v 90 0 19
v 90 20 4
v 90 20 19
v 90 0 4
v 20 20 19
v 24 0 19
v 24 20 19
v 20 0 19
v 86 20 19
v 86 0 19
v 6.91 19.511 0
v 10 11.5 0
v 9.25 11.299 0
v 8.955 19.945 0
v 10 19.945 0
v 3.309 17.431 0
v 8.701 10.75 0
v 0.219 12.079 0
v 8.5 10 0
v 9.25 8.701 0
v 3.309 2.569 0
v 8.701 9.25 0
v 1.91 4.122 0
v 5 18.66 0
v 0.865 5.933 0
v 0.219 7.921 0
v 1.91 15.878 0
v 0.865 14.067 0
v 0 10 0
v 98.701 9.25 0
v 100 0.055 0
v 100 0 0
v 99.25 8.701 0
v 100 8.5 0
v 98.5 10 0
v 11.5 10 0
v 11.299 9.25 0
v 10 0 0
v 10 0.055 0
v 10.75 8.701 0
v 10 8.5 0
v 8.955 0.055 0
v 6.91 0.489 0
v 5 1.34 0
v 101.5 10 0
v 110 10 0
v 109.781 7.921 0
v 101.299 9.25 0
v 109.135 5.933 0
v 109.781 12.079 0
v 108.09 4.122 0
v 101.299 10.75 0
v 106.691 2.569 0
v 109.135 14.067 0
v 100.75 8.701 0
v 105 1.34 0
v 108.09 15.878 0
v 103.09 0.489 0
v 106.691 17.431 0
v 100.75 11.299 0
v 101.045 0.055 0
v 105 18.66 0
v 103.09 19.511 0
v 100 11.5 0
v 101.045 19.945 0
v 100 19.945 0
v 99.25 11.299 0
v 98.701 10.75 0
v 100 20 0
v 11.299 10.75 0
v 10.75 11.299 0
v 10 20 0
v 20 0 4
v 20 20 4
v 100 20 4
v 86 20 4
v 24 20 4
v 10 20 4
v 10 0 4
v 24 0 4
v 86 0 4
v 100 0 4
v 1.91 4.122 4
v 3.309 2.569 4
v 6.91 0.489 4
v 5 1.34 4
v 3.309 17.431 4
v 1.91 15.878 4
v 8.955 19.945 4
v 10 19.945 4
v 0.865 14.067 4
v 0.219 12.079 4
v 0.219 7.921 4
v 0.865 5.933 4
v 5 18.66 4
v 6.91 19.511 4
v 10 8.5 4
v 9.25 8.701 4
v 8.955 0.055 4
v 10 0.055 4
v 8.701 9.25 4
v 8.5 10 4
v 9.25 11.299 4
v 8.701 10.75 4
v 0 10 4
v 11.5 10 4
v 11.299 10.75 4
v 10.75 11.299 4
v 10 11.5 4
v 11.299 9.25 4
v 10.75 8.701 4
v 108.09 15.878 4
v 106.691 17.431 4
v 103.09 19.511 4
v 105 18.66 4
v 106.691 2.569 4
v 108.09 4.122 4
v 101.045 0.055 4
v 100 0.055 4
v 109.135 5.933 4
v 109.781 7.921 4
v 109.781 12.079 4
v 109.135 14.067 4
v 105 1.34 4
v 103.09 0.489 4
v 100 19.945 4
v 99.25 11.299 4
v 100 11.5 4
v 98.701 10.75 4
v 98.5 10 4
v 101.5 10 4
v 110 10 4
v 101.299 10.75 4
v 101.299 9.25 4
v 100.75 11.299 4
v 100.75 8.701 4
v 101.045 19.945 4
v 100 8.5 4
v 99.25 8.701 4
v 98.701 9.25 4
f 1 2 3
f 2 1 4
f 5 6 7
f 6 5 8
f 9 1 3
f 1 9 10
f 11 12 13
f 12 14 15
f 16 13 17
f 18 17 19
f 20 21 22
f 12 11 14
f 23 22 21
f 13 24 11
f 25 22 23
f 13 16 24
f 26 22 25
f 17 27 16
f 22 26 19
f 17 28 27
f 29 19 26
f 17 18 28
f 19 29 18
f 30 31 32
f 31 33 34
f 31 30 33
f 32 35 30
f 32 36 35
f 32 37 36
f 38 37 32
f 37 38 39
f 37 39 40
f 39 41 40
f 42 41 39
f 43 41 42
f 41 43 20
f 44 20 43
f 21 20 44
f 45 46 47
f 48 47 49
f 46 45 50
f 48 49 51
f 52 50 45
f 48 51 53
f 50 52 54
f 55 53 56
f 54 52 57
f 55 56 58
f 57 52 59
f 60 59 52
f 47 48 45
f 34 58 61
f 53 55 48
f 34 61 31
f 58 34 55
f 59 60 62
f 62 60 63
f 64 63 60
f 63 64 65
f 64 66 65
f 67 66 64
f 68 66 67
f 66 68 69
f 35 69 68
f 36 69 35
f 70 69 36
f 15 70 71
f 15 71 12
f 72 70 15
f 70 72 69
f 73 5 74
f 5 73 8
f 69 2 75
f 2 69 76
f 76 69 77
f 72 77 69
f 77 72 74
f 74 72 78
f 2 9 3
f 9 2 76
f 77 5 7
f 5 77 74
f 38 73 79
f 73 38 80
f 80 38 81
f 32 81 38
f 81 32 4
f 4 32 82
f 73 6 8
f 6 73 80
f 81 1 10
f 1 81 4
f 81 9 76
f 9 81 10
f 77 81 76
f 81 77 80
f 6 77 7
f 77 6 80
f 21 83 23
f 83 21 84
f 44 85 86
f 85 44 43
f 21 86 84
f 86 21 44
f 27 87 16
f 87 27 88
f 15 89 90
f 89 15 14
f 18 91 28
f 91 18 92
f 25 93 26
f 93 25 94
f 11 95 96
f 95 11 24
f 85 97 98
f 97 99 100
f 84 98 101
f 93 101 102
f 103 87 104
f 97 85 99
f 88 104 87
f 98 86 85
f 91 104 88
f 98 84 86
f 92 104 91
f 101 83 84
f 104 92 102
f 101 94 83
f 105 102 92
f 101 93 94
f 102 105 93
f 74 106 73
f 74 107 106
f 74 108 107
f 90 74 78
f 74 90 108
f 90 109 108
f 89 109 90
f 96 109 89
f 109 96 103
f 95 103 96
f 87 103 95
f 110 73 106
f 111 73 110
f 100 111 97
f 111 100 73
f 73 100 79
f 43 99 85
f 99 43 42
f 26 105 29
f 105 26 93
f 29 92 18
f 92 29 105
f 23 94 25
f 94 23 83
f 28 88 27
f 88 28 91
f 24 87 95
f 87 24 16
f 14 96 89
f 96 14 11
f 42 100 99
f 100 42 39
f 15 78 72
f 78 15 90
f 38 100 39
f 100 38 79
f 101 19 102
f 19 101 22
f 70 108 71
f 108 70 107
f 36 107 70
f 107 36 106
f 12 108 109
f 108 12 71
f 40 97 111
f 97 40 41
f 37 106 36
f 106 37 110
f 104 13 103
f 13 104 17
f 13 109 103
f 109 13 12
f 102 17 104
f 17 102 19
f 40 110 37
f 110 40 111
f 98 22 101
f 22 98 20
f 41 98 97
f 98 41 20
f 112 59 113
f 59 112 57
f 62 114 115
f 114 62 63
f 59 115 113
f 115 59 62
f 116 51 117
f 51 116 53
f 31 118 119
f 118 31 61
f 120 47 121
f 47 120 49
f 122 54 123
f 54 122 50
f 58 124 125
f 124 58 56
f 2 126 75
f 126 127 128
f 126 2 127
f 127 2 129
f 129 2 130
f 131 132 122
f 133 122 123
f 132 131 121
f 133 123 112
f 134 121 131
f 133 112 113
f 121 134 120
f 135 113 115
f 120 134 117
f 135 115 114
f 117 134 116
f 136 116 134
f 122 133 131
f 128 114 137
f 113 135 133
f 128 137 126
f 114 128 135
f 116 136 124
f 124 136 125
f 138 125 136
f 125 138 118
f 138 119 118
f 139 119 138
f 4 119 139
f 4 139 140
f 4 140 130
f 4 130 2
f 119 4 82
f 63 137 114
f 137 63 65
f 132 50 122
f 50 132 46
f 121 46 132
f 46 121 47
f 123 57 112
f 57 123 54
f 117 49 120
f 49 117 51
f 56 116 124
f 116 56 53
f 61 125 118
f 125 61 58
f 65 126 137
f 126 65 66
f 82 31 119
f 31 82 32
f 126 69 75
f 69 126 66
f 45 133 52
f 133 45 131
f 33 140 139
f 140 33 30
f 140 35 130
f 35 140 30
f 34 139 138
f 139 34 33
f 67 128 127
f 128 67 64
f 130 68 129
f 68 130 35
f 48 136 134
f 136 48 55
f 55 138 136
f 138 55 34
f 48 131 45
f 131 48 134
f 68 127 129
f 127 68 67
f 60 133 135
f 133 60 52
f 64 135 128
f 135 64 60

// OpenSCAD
/**
 * @author Kamil Jiwa <kamil.jiwa@gmail.com>
 * @license GPL-3.0
 */

module _tab(width, thickness, screw_diameter) {
  difference() {
    union() {
      cylinder(r=width / 2, h=thickness);
      translate([0, -width / 2, 0]) cube([width / 2, width, thickness]);
    }

    translate([0, 0, -thickness]) cylinder(r=screw_diameter / 2, h=3 * thickness, $fn=12);
  }
}

module ramps_bracket(length, width, height, thickness, screw_diameter) {
  translate([width, 0, 0]) difference() {
    cube([length + 2 * thickness, width, height + thickness]);
    translate([thickness, -thickness, thickness])
        cube([length, width + 2 * thickness, height + thickness]);
  }

  translate([width / 2, width / 2, 0])
      _tab(width, thickness, screw_diameter);
  translate([3 * width / 2 + 2 * thickness + length, width / 2, 0])
      rotate([0, 0, 180])
      _tab(width, thickness, screw_diameter);
}

ramps_bracket(62, 20, 15, 4, 3);
